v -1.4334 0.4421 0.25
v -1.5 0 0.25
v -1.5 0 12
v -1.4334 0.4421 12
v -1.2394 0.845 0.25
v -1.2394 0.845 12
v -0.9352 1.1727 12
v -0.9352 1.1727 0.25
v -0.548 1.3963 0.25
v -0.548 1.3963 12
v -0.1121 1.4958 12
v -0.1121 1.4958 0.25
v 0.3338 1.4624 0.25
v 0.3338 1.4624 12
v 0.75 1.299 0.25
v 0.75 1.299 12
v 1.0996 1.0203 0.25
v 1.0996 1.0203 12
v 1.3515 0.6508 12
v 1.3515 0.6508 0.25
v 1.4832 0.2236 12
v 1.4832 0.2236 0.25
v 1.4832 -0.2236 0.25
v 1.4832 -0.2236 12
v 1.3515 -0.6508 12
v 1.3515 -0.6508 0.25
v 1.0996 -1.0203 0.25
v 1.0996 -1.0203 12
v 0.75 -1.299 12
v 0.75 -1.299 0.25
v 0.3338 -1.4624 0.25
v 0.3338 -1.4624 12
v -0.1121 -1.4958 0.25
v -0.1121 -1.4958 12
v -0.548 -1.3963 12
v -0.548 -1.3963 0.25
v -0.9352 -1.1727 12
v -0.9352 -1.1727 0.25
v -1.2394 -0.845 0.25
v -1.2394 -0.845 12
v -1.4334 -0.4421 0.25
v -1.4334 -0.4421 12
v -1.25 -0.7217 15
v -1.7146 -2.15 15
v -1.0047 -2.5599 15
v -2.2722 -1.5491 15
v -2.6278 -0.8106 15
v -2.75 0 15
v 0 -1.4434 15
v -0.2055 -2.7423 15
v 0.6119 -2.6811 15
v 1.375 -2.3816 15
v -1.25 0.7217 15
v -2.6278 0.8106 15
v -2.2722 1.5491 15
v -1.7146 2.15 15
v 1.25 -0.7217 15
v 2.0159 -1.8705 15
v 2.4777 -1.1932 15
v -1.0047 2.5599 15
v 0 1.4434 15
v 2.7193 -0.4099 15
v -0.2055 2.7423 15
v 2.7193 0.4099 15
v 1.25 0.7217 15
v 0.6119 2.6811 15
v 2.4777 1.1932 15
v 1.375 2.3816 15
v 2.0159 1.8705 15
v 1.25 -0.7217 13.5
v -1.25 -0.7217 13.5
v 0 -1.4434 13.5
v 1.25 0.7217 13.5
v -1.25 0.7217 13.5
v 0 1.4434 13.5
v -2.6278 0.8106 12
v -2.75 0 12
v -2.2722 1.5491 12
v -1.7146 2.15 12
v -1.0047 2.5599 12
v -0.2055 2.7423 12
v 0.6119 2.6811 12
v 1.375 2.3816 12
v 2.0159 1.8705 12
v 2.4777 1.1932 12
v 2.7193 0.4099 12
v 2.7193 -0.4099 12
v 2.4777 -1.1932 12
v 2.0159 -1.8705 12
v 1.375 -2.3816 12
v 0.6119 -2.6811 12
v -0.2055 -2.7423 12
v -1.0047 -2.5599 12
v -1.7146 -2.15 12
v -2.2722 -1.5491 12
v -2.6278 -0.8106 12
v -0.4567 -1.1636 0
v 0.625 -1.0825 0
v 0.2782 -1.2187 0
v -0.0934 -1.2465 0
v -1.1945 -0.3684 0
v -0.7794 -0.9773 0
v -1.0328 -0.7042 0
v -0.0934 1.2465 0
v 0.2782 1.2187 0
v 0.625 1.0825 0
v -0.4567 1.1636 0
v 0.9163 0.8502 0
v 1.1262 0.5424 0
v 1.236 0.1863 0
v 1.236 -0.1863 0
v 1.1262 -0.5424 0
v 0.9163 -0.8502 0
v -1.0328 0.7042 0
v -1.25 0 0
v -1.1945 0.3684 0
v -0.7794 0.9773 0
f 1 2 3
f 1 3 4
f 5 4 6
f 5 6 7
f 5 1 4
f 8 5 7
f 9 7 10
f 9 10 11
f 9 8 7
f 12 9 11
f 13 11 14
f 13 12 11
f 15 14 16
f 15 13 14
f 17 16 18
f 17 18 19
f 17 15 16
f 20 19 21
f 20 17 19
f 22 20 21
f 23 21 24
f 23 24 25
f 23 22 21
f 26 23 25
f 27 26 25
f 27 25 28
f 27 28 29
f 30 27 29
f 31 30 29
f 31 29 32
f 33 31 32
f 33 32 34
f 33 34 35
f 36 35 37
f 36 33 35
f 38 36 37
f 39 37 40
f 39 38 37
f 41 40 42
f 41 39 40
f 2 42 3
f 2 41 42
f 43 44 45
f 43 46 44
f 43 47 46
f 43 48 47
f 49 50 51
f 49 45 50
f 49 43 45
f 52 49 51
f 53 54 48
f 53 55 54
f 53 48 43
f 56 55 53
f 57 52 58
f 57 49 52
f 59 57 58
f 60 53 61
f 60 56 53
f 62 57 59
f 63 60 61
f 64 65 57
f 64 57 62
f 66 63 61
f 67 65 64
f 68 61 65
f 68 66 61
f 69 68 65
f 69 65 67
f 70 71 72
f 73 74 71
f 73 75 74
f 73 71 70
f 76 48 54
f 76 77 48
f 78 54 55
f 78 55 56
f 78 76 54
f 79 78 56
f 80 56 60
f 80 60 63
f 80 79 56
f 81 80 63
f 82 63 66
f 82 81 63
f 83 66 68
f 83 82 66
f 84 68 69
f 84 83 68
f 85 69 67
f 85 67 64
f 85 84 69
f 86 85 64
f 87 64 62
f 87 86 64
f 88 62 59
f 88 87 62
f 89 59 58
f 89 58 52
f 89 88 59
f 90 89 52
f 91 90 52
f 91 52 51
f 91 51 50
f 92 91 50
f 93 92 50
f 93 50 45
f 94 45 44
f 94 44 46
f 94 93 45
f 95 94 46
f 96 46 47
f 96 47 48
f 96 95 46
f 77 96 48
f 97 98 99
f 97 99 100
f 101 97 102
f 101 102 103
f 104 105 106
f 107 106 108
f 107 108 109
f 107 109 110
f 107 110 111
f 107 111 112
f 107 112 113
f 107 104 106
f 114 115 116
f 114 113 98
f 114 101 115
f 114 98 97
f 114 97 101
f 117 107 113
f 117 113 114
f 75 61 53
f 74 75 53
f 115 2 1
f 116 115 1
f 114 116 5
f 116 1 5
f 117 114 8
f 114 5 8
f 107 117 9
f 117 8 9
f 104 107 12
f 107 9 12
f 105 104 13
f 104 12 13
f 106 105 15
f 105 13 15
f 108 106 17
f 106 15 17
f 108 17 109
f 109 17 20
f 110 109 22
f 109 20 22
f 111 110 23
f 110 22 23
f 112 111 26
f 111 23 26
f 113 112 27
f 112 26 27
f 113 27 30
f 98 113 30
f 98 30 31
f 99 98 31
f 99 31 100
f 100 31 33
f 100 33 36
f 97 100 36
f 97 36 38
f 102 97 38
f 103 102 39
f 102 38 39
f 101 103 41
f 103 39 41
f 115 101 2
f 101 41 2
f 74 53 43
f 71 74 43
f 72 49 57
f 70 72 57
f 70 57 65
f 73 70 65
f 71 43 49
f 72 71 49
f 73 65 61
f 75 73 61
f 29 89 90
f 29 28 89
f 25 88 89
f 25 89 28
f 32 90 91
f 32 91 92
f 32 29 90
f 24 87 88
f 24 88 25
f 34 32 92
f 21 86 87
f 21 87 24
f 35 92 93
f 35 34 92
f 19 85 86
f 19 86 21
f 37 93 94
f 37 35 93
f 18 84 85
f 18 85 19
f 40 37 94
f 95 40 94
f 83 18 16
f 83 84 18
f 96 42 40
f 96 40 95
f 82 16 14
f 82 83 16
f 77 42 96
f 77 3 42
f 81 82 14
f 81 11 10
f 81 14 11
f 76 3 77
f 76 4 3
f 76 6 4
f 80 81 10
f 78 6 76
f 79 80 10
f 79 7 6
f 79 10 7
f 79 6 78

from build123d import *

# Parameters (mm, degrees)
F3_DEPTH = 1.5
F4_SIZE  = 0.25


with BuildPart() as f1:
    # F0 (on Front) → F1 (revolve)
    with BuildSketch(Plane.XZ):
        Polygon((-1.5, 0), (0, 0), (0, 15), (-2.75, 15), (-2.75, 12), (-1.5, 12), align=None)
    revolve(axis=Axis((0, 0, -2.50989), (0, 0, -1)))

    # F2 (on face) → F3 (cut)
    with BuildSketch(Plane.XY.offset(15)):
        Polygon((-1.25, 0.721688), (-1.25, -0.721688), (0, -1.443376), (1.25, -0.721688), (1.25, 0.721688), (0, 1.443376), align=None)
    extrude(amount=-F3_DEPTH, mode=Mode.SUBTRACT)

    # F4
    f4_edges = [f1.edges().sort_by_distance(p)[0] for p in [
        (1.5, 0, 0),
    ]]
    chamfer(f4_edges, length=F4_SIZE)


solid = f1.part
